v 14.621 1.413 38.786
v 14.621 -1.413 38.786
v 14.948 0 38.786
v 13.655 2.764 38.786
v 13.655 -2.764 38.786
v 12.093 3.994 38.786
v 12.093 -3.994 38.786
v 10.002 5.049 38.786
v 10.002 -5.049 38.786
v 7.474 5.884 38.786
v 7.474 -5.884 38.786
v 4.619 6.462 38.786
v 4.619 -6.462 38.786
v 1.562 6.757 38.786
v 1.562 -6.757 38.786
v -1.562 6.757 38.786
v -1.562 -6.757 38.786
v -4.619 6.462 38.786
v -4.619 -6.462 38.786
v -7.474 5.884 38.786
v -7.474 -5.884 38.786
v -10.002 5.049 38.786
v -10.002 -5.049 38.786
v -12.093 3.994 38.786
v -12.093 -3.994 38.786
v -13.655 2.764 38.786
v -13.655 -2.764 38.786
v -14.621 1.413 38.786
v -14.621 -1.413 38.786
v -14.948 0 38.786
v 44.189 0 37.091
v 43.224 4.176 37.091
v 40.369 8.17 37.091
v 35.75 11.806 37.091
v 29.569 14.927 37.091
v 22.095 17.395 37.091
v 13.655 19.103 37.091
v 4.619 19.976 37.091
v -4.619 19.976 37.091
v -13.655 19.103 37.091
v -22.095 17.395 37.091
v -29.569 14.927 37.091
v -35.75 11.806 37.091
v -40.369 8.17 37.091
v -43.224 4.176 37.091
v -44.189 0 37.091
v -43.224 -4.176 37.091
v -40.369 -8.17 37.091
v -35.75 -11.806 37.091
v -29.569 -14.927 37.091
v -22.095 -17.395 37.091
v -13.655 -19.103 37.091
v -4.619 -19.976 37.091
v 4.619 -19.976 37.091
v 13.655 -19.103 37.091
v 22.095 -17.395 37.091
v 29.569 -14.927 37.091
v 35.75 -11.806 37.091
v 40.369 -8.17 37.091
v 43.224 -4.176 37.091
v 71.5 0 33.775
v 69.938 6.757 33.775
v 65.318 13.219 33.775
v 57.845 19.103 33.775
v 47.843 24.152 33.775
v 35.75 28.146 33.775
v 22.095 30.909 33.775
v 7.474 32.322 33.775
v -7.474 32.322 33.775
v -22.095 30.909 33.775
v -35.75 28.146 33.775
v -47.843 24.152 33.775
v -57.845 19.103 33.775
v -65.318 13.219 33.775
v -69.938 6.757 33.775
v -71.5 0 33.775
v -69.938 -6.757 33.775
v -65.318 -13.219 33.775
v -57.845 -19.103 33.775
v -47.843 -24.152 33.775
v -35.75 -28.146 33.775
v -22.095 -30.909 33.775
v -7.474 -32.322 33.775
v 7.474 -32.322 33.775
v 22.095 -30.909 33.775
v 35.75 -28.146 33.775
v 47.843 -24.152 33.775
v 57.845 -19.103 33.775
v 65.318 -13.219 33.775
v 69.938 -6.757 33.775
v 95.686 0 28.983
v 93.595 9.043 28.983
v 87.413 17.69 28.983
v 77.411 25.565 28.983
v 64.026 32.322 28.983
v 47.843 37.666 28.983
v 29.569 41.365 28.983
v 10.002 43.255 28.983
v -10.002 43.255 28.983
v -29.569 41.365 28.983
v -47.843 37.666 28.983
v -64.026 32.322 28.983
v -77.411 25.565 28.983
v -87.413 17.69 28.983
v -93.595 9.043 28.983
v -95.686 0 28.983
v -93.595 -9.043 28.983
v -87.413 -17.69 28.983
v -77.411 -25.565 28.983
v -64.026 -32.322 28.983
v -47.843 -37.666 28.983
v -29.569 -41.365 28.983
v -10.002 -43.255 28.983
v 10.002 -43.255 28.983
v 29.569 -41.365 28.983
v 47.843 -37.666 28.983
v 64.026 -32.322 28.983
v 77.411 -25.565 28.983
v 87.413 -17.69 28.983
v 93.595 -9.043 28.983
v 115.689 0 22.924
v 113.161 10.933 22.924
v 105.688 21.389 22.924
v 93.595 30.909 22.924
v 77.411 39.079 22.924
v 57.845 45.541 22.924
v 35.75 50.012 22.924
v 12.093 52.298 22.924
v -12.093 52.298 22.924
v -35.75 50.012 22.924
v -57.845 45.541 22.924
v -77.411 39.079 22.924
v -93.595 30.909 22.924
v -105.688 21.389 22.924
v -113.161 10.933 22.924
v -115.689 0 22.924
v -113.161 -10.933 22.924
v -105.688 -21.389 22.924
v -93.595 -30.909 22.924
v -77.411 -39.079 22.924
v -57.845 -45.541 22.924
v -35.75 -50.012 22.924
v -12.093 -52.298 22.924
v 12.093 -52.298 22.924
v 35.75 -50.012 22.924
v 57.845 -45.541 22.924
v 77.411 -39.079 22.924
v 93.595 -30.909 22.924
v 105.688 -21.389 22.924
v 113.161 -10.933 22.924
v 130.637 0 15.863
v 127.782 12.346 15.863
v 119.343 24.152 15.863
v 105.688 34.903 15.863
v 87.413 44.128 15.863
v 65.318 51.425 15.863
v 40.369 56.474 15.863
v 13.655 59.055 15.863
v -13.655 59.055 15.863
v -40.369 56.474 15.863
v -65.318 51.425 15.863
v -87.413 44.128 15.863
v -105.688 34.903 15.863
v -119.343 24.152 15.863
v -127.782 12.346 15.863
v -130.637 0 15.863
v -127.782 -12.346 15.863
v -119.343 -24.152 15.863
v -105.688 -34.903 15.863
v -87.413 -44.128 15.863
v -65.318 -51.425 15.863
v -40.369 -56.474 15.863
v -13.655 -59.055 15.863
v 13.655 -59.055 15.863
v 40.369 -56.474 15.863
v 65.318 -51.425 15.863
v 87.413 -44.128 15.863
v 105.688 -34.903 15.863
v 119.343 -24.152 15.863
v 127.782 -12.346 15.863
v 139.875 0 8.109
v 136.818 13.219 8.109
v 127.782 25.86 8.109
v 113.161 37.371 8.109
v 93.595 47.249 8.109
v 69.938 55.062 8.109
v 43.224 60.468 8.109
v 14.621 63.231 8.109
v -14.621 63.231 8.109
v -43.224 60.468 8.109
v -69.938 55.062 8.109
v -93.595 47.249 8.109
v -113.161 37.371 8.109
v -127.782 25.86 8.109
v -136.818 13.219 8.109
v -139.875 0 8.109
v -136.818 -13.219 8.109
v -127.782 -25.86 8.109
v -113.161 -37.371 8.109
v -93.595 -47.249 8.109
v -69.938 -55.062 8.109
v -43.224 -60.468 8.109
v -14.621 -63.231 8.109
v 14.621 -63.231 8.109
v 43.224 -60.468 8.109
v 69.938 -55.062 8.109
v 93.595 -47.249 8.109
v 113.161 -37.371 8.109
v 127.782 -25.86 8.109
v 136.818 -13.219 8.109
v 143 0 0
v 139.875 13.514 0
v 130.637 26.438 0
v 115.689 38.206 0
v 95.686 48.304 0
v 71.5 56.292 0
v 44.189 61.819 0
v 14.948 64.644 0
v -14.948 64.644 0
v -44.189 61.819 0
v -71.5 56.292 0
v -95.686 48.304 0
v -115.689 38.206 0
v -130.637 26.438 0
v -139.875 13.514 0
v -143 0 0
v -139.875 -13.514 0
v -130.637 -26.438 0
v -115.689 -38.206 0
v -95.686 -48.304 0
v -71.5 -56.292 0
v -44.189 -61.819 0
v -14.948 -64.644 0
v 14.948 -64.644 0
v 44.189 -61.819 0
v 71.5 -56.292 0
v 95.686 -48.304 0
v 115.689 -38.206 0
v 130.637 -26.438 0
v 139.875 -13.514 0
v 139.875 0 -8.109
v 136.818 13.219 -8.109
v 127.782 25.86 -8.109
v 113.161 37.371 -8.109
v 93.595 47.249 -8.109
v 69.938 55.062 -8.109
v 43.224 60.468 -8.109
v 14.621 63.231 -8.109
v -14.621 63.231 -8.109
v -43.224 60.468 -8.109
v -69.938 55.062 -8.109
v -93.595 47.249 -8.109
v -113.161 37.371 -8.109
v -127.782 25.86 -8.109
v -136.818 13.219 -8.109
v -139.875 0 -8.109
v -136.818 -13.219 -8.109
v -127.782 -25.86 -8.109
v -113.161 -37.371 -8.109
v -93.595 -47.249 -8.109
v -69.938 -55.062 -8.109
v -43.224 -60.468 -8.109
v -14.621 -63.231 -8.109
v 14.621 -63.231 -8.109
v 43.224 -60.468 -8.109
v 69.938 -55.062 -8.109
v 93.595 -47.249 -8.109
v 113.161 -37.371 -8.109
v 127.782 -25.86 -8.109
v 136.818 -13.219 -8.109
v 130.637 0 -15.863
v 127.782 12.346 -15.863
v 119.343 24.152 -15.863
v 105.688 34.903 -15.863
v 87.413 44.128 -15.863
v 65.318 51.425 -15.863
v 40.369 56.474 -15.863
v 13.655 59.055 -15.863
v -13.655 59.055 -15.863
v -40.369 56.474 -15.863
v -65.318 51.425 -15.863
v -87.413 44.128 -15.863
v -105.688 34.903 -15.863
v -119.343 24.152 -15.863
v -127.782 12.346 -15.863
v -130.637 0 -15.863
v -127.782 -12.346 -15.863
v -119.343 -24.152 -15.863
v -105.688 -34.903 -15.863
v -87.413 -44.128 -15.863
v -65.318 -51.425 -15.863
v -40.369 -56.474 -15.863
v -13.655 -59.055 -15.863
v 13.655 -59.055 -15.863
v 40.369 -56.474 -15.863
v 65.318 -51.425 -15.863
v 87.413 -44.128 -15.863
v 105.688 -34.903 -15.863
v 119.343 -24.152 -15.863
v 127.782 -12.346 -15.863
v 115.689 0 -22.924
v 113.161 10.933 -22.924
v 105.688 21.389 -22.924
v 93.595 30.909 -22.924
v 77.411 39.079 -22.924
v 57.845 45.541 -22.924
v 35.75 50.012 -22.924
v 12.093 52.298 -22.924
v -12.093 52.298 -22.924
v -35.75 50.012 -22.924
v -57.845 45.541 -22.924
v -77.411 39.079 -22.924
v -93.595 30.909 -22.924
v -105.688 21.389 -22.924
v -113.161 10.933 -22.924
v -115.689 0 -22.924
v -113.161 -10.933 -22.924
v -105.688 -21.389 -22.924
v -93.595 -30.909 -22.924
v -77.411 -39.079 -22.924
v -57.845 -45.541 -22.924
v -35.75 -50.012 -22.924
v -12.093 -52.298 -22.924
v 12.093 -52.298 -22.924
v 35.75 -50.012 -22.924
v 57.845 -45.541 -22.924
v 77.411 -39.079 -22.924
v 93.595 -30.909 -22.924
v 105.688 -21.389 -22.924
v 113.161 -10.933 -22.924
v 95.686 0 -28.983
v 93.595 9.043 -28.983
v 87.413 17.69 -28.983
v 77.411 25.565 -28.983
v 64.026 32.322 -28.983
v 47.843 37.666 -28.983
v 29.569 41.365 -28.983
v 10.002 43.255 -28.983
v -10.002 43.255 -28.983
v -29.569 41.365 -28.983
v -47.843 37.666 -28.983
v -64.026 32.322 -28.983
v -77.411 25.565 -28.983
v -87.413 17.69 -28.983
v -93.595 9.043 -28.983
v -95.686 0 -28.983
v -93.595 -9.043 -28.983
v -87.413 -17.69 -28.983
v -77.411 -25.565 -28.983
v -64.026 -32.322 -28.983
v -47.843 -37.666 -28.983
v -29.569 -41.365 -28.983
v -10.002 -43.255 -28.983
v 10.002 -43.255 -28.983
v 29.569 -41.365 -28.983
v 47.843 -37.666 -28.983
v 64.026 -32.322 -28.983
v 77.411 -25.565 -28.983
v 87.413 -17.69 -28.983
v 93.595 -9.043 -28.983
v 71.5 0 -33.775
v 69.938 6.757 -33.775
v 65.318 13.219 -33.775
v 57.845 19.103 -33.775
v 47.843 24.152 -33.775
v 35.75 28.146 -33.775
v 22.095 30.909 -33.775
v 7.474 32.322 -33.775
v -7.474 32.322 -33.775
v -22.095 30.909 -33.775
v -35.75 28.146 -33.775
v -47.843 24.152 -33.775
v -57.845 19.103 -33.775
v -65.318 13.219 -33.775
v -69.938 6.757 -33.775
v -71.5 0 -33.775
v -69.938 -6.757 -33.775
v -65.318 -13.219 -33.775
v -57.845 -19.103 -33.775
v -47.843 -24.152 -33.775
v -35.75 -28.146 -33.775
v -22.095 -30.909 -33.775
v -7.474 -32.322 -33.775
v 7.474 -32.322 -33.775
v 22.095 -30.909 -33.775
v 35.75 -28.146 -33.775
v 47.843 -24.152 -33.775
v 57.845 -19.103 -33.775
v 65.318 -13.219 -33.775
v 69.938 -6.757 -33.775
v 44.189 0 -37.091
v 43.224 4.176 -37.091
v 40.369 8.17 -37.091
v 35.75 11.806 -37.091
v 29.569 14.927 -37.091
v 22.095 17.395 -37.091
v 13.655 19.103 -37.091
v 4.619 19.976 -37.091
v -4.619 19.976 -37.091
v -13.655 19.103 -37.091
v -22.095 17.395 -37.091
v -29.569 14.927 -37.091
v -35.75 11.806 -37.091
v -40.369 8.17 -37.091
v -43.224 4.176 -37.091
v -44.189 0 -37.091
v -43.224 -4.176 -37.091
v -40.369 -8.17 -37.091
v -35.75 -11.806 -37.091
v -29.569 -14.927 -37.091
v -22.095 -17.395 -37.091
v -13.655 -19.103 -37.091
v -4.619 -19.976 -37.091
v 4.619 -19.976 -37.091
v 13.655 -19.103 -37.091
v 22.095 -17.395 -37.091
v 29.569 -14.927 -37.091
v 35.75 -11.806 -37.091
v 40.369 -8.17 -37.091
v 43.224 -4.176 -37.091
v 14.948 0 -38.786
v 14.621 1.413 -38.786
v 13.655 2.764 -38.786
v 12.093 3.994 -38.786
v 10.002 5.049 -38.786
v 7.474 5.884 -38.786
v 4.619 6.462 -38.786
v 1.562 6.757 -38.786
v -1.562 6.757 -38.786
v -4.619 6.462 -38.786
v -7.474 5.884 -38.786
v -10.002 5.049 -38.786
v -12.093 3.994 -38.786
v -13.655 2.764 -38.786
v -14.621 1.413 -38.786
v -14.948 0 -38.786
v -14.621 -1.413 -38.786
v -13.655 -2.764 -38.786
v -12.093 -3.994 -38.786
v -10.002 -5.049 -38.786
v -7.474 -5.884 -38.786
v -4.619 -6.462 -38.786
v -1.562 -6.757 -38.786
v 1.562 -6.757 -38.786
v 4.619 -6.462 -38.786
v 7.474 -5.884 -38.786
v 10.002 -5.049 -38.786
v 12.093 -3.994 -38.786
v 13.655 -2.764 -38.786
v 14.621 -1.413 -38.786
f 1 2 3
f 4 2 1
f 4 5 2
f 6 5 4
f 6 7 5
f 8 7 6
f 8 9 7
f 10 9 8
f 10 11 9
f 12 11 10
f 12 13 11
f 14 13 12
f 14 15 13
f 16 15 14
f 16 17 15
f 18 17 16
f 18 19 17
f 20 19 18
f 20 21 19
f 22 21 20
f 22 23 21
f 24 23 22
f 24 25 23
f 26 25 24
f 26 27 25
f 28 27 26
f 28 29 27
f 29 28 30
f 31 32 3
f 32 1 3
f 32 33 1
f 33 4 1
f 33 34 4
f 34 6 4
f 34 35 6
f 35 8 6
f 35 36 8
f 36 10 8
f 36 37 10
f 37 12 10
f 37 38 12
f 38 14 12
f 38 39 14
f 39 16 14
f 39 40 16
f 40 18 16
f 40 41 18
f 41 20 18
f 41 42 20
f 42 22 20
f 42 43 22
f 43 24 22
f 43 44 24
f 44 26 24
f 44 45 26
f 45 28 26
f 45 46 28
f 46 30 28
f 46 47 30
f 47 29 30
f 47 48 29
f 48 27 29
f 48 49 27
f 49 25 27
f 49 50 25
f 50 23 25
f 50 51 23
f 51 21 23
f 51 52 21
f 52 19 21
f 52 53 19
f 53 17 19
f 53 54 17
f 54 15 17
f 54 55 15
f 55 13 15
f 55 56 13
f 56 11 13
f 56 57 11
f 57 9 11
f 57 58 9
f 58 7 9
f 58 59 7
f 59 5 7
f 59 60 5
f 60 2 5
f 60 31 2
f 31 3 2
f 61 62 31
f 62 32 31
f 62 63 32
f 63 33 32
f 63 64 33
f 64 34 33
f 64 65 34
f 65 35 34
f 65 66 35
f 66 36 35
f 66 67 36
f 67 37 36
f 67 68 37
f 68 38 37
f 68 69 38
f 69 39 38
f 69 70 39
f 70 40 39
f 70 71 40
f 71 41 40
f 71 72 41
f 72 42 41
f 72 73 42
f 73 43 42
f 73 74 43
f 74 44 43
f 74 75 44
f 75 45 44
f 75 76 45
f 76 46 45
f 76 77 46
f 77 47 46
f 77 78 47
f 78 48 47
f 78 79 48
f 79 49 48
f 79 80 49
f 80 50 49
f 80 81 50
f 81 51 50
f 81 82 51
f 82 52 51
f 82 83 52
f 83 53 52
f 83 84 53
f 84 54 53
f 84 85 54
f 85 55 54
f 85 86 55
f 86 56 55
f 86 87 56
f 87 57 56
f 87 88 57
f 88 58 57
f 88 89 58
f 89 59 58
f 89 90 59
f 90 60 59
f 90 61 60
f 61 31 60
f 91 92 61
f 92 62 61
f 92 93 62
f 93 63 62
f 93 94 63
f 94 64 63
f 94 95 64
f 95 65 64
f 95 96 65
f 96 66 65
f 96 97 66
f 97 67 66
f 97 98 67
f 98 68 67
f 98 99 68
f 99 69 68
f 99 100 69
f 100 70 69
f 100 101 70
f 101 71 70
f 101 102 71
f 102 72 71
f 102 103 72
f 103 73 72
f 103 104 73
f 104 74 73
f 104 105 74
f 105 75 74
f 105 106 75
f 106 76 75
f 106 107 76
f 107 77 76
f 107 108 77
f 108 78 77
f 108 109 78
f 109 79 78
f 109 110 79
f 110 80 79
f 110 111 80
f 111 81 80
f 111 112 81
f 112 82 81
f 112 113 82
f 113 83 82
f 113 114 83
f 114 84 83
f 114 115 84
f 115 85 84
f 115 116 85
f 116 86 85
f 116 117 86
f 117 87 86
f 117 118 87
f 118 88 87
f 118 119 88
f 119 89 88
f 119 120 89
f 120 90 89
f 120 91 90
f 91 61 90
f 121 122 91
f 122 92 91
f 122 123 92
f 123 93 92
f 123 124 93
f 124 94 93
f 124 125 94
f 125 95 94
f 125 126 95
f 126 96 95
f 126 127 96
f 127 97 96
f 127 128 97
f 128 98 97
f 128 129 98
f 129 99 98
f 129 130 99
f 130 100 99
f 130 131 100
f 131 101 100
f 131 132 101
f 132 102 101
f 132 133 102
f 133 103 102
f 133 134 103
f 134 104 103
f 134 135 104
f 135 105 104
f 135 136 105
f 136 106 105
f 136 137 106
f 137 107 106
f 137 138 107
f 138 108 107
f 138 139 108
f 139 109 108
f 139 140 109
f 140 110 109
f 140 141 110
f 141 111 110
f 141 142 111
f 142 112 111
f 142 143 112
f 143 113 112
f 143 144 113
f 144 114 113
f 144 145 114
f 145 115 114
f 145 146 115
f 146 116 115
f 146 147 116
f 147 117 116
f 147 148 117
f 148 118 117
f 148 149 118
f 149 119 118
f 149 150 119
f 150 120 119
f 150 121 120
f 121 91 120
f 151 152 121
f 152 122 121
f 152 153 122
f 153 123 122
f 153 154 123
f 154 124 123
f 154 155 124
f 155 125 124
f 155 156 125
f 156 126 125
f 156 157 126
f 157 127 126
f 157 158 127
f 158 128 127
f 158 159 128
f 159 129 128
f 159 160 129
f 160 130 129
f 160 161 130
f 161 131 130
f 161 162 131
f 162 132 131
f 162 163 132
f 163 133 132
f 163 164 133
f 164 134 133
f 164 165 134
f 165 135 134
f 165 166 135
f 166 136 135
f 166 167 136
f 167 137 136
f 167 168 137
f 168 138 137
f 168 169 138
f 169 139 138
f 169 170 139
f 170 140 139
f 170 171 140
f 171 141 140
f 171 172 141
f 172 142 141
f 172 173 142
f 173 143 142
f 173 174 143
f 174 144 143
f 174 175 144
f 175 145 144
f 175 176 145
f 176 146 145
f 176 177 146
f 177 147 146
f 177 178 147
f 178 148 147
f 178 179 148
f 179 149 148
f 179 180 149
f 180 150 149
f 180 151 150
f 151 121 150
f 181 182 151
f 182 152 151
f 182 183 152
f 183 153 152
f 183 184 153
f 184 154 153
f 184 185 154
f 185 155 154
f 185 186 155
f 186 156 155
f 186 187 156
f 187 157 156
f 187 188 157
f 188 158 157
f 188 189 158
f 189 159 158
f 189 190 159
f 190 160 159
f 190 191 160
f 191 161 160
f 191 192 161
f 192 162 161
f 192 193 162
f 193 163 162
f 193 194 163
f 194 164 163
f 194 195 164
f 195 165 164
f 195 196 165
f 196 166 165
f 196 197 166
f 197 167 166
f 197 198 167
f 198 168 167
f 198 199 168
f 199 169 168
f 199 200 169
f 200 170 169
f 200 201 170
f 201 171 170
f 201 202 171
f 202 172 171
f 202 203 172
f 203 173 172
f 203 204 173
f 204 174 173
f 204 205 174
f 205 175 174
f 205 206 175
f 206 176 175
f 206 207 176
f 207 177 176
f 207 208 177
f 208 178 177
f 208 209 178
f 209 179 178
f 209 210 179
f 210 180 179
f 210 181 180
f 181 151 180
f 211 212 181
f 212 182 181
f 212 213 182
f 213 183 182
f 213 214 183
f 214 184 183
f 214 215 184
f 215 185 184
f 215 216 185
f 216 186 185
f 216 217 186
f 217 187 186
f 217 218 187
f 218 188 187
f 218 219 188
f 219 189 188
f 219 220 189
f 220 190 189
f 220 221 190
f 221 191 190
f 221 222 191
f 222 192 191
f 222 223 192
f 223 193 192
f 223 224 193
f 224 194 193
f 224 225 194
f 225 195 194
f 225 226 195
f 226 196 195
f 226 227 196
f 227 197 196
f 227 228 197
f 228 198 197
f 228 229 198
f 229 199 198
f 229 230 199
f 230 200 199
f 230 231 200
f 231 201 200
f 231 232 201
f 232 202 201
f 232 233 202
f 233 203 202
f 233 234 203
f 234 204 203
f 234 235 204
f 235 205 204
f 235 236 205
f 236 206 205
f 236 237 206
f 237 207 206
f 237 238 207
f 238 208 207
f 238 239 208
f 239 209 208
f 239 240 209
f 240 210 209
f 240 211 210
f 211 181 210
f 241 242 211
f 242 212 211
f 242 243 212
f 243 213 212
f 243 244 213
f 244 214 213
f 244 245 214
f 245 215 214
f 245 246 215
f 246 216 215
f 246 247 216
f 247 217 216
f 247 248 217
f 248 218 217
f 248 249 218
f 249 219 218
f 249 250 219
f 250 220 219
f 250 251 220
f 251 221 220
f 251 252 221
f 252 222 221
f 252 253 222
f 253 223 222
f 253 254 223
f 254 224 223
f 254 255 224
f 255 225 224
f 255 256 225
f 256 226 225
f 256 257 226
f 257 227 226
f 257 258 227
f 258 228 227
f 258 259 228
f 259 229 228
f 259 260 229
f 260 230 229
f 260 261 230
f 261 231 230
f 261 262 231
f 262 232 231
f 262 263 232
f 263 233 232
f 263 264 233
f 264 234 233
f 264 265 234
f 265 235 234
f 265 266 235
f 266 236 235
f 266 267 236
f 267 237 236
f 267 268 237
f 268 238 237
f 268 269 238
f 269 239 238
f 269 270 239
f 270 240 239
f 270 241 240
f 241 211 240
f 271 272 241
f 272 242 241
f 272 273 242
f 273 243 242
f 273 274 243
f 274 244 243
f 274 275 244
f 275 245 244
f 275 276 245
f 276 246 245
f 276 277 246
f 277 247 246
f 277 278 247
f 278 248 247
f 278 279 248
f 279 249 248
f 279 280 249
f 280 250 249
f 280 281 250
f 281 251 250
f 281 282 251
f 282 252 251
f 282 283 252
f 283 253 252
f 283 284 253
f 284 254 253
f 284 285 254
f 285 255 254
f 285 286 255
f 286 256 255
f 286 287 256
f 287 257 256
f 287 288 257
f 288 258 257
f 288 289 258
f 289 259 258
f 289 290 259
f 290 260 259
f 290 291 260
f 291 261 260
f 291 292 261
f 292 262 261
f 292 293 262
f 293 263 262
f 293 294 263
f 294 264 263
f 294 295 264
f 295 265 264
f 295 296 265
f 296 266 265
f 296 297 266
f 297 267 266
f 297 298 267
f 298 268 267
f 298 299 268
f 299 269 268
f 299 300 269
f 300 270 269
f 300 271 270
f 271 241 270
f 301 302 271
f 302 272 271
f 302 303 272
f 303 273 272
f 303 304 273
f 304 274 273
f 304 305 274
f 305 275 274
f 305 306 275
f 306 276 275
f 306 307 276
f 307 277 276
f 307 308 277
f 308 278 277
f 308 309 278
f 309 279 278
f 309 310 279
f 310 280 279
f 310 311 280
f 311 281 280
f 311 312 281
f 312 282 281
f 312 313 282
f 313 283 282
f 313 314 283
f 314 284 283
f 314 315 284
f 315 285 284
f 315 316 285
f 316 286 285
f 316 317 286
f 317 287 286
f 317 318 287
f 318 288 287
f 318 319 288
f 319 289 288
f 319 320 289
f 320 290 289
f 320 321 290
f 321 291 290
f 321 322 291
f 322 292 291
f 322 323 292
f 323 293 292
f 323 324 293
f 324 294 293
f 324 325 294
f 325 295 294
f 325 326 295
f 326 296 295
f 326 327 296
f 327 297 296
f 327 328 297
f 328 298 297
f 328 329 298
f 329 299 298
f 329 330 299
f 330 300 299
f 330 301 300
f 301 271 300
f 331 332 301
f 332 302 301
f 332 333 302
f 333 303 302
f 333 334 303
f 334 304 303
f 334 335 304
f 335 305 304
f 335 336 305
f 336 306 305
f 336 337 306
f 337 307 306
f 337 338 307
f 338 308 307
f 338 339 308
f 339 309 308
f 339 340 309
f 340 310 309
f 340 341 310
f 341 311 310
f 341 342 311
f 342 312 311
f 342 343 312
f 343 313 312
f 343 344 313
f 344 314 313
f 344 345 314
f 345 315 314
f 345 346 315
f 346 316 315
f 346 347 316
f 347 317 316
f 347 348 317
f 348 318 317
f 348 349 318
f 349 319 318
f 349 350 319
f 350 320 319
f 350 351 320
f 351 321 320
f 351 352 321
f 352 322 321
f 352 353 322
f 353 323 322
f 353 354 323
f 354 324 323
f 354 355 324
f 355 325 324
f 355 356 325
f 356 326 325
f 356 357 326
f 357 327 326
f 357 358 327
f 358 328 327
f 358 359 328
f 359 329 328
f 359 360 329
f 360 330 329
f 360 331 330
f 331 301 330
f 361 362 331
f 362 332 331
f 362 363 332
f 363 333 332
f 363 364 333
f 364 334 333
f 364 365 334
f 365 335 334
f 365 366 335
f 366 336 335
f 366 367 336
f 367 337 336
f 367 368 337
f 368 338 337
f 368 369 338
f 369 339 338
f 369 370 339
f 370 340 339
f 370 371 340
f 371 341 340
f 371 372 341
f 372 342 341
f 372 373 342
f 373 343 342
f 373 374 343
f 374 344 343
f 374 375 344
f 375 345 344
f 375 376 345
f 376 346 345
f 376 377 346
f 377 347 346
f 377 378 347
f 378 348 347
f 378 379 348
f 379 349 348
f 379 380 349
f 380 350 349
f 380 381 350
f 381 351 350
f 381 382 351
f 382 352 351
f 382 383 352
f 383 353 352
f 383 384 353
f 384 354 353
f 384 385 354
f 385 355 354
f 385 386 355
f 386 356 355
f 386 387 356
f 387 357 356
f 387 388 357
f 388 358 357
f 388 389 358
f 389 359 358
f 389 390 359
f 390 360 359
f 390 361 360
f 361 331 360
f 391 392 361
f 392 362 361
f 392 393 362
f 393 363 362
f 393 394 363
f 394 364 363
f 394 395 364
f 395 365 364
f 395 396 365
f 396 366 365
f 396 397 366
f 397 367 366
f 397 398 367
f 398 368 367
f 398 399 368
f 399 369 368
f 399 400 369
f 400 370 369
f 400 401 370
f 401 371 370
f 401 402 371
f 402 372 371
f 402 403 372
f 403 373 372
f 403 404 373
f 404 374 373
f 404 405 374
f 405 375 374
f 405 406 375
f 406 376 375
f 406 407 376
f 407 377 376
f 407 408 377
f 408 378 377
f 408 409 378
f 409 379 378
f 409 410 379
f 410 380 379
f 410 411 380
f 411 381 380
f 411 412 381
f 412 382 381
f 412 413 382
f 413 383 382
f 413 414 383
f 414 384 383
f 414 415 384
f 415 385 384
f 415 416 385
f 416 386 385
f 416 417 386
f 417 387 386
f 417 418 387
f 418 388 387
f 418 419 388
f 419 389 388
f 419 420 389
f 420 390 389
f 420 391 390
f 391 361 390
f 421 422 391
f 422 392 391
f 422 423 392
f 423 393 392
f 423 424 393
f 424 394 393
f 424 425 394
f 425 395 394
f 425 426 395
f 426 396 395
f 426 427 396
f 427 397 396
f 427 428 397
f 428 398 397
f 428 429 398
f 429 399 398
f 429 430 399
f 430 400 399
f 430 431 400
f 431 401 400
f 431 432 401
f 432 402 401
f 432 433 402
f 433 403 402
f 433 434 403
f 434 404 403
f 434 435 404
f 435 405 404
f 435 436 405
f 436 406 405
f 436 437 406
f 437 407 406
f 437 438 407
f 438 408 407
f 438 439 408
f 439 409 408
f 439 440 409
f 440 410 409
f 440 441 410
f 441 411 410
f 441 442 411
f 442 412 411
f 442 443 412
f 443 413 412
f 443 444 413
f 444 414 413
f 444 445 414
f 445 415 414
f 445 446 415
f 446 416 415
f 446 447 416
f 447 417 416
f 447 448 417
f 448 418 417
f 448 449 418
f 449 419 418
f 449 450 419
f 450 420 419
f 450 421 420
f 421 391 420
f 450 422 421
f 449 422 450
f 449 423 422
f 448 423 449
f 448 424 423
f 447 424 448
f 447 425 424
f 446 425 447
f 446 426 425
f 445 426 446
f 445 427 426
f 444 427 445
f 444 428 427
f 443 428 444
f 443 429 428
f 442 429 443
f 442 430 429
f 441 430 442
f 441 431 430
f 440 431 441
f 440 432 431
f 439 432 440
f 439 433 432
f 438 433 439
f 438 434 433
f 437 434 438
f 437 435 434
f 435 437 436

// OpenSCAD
// Generated by SolidPython 1.0.1 on 2020-07-29 00:46:49


scale(v = [11, 5, 3]) {
	sphere(r = 13);
}
/***********************************************
*********      SolidPython code:      **********
************************************************
 
# import packages: SolidPython
from solid import *
from solid.utils import *
from itertools import chain, combinations, permutations


class Resize:

    def __init__(self, scad_file):
        self.scad_file = scad_file
        #self.scad_file = import_scad(scad_file)
        # cone/cylinder param:
        self.r1 = 0
        self.r2 = 0
        self.h = 0
        # rectangular prism param:
        self.w = 0
        self.l = 0
        # ellipse param:
        self.r = 0

    # import OpenScad code (file name corresponds to shape)


    # classify shape + parameters
    def assign(self, param1, param2, param3):
        if self.scad_file == 'cone.scad':
            self.r1 = param1
            self.r2 = param2
            self.h = param3
        elif self.scad_file == 'cylinder.scad':
            self.r1 = param1
            self.r2 = param2
            self.h = param3
        elif self.scad_file == 'rectangularPrism.scad':
            self.h = param1
            self.l = param2
            self.w = param3
        else:
            self.r = param1
            self.h = param2

    # resize parameters
    def iterate(self):
        x = range(3, 20, 2)
        i = 1
        if self.scad_file == 'cone.scad':
            tempList = list(permutations(x, 2))
            for temp in tempList:
                param1 = temp[0]
                param2 = temp[1]
                filepath = 'produced_scad_files/' + 'cone' + str(param1) + '_' + str(param2) + '_' + '.scad'
                scad_render_to_file(cylinder(h=param1, r1=param2, r2=0), filepath)

        elif self.scad_file == 'cylinder.scad':
            tempList = list(permutations(x, 3))
            for temp in tempList:
                param1 = temp[0]
                param2 = temp[1]
                filepath = 'produced_scad_files/' + 'cylinder' + str(param1) + '_' + str(param2) + '_' + '.scad'
                scad_render_to_file(cylinder(h=param1, r1=param2, r2=param2), filepath)

        elif self.scad_file == 'rectangularPrism.scad':
            tempList = list(permutations(x, 3))
            for temp in tempList:
                param1 = temp[0]
                param2 = temp[1]
                param3 = temp[2]
                filepath = 'produced_scad_files/' + 'rectangularPrism' + str(param1) + '_' + str(param2) + '_' + str(
                    param3) + '.scad'
                scad_render_to_file(cube(size=(param1, param2, param3)), filepath)

        elif self.scad_file == 'ellipse.scad':
            tempList = list(permutations(x, 4))
            for temp in tempList:
                param1 = temp[0]
                param2 = temp[1]
                param3 = temp[2]
                param4 = temp[3]
                filepath = 'produced_scad_files/' + 'ellipse' + str(param1) + '_' + str(param2) + '_' + str(param3) + '_' + str(param4) + '.scad'
                scad_render_to_file(scale([param1, param2, param3])(sphere(r=param4)), filepath)

    def render_to_scadfile(self):
        scad_render_to_file(scad, 'example.scad') 
 
************************************************/
